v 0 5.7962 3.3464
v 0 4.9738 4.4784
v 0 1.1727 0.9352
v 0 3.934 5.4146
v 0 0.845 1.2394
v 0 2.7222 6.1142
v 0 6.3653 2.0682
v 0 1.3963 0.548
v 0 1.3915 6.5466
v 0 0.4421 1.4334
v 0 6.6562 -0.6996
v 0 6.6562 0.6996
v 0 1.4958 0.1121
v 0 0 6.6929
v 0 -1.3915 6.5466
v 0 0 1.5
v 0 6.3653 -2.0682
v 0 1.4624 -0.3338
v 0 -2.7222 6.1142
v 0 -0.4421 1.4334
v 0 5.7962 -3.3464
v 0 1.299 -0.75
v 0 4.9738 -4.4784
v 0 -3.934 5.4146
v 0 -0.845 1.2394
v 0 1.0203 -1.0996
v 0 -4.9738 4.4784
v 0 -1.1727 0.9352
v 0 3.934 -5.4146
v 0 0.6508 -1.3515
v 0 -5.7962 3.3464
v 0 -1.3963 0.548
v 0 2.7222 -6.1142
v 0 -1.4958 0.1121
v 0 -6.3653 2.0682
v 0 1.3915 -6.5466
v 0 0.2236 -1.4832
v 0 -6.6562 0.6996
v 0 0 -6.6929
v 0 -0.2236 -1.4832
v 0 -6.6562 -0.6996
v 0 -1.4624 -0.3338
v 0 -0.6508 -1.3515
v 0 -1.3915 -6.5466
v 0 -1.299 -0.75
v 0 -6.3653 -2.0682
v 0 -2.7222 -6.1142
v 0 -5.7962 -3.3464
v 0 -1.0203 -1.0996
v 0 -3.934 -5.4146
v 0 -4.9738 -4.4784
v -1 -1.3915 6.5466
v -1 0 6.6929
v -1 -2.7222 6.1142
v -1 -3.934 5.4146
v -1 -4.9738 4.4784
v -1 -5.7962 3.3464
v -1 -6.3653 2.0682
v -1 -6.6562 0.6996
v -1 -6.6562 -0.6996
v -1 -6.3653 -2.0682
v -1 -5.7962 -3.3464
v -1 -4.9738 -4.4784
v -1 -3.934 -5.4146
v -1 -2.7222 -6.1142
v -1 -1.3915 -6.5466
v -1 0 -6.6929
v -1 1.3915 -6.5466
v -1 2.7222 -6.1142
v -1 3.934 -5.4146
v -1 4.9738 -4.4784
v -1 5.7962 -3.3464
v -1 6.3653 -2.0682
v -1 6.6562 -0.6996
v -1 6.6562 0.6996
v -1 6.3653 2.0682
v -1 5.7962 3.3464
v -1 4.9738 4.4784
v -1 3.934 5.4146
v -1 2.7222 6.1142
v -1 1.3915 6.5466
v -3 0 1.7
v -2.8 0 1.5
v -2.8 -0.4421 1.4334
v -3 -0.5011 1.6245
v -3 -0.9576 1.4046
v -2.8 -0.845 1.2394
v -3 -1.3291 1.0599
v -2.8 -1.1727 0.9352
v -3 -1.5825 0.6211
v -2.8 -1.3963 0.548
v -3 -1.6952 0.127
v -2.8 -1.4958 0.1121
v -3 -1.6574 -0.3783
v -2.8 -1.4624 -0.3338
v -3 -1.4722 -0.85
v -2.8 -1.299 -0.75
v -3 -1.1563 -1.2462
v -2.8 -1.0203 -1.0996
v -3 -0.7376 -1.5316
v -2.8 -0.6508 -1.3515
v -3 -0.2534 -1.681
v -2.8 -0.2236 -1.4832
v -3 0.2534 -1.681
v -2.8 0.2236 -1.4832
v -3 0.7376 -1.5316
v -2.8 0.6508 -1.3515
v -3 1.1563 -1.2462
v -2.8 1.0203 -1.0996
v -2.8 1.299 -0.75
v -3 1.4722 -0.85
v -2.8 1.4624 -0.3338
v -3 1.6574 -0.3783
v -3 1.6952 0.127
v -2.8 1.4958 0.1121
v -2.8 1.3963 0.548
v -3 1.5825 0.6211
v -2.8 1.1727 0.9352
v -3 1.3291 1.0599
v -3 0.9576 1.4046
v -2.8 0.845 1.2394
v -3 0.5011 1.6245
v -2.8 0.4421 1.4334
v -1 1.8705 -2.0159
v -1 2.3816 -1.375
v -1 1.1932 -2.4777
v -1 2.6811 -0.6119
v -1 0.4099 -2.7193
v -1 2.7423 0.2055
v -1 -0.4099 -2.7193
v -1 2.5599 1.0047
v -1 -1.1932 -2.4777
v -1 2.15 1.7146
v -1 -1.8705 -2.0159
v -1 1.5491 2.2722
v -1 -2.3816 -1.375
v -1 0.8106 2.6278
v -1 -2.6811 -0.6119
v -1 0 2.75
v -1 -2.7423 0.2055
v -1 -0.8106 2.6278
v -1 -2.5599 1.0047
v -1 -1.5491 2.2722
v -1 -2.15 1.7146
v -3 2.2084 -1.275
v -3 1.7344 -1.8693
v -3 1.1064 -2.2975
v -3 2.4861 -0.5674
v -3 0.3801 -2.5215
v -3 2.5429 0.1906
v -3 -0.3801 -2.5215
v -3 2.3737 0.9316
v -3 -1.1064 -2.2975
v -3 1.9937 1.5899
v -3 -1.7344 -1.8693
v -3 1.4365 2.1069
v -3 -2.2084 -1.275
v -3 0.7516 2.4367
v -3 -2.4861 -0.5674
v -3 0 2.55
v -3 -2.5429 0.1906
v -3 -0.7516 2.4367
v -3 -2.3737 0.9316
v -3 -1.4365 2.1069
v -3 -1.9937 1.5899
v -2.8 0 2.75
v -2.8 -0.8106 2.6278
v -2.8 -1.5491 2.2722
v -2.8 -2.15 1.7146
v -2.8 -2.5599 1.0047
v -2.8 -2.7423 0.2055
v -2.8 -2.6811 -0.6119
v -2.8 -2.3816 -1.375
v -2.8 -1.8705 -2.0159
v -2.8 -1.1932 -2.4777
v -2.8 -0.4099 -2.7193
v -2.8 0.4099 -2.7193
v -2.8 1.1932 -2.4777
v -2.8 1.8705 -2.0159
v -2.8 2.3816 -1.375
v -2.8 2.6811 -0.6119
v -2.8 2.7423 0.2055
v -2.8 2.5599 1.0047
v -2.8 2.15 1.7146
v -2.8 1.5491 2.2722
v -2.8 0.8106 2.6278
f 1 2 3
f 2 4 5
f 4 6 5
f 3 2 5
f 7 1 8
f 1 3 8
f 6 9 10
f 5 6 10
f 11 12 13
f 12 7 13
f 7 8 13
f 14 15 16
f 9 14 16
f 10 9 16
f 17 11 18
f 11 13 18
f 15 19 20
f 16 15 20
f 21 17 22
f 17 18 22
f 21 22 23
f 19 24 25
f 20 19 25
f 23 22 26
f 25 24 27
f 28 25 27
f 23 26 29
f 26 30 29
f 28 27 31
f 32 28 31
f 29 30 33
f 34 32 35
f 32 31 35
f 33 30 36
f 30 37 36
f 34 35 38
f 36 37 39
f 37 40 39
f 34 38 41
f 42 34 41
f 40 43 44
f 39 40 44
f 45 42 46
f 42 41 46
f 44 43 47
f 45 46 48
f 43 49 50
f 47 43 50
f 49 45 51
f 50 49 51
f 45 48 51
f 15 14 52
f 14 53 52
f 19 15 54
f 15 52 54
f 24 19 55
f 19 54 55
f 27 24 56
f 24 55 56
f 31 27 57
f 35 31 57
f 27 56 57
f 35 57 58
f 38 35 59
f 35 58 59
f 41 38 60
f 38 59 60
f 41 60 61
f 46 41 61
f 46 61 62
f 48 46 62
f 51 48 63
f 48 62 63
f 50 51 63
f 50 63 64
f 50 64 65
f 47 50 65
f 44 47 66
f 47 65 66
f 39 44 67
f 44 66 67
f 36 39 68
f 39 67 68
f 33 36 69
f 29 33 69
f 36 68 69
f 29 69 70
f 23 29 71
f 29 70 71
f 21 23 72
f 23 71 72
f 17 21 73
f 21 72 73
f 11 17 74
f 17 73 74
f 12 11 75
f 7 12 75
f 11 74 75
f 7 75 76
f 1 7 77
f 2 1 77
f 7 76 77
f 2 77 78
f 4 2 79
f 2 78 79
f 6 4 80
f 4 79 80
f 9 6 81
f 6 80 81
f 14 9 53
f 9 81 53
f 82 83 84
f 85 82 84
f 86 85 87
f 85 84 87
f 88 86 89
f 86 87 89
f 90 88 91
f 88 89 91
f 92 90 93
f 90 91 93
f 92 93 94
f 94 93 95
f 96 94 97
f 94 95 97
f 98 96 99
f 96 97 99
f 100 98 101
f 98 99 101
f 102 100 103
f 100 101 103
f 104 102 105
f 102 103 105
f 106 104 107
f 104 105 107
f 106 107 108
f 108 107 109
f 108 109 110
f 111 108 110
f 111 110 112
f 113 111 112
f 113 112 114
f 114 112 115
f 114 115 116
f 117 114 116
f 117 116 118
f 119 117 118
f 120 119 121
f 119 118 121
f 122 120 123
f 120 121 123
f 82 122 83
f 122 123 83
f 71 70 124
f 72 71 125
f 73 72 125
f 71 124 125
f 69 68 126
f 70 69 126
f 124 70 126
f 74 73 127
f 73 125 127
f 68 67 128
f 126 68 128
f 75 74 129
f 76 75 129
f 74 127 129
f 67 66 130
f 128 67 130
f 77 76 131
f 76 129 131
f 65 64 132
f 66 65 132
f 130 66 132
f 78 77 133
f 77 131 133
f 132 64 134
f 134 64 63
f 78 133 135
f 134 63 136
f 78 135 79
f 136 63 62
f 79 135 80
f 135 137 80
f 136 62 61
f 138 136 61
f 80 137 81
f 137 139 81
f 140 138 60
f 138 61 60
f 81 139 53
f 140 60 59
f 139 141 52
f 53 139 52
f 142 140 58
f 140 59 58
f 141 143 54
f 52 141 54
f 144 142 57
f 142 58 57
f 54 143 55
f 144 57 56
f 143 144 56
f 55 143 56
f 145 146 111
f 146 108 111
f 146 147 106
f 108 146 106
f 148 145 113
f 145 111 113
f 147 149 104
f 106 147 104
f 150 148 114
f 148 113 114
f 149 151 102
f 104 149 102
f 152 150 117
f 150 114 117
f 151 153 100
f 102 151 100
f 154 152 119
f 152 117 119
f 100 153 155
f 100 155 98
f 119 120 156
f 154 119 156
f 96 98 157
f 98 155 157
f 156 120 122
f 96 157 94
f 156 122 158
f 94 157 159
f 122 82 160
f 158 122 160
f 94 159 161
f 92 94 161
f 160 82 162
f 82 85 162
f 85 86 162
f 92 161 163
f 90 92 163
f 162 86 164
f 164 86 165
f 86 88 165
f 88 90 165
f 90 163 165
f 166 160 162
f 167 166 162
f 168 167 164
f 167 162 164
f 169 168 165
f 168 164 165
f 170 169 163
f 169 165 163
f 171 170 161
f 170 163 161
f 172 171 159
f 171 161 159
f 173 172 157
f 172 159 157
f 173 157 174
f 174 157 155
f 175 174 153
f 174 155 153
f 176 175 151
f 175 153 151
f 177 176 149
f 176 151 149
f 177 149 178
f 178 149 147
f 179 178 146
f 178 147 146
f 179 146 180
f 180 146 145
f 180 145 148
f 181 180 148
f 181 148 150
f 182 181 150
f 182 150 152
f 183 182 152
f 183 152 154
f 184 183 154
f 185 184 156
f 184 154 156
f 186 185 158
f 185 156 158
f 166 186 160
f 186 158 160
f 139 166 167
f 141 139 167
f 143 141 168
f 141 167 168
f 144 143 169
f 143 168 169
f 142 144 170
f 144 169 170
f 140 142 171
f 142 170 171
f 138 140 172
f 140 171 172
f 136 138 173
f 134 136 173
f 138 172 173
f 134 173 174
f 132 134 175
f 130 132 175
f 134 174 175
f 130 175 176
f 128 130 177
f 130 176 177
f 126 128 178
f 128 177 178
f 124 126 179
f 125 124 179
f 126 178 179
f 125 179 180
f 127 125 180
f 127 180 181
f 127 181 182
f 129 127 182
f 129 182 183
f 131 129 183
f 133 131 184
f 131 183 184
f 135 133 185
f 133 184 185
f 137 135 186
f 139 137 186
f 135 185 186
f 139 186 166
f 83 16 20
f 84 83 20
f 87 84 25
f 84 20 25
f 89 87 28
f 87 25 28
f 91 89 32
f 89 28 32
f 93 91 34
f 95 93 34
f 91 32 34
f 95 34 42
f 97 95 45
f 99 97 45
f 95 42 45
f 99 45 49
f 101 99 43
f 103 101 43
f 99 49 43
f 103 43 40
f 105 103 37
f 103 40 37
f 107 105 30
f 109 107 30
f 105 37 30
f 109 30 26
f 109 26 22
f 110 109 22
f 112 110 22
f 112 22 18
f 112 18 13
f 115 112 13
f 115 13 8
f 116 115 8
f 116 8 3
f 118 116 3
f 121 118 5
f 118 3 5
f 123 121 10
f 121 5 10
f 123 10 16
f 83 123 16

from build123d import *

# Parameters (mm, degrees)
CHAMFER_1_SIZE = 0.2


with BuildPart() as part:
    # 草图1 → 旋转1 (revolve)
    with BuildSketch(Plane.XY, mode=Mode.PRIVATE) as revolve_1_sk:
        Polygon((0, 1.5), (0, 6.692857143), (-1, 6.692857143), (-1, 2.75), (-3, 2.75), (-3, 1.5), align=None)
    revolve(revolve_1_sk.sketch.rotate(Axis((-9.1, 0, 0), (1, 0, 0)), 90), axis=Axis((-9.1, 0, 0), (1, 0, 0)))

    # 倒角1
    chamfer_1_edges = [part.edges().sort_by_distance(p)[0] for p in [
        (-3, 0, -1.5),
        (-3, 0, -2.75),
    ]]
    chamfer(chamfer_1_edges, length=CHAMFER_1_SIZE)


solid = part.part
